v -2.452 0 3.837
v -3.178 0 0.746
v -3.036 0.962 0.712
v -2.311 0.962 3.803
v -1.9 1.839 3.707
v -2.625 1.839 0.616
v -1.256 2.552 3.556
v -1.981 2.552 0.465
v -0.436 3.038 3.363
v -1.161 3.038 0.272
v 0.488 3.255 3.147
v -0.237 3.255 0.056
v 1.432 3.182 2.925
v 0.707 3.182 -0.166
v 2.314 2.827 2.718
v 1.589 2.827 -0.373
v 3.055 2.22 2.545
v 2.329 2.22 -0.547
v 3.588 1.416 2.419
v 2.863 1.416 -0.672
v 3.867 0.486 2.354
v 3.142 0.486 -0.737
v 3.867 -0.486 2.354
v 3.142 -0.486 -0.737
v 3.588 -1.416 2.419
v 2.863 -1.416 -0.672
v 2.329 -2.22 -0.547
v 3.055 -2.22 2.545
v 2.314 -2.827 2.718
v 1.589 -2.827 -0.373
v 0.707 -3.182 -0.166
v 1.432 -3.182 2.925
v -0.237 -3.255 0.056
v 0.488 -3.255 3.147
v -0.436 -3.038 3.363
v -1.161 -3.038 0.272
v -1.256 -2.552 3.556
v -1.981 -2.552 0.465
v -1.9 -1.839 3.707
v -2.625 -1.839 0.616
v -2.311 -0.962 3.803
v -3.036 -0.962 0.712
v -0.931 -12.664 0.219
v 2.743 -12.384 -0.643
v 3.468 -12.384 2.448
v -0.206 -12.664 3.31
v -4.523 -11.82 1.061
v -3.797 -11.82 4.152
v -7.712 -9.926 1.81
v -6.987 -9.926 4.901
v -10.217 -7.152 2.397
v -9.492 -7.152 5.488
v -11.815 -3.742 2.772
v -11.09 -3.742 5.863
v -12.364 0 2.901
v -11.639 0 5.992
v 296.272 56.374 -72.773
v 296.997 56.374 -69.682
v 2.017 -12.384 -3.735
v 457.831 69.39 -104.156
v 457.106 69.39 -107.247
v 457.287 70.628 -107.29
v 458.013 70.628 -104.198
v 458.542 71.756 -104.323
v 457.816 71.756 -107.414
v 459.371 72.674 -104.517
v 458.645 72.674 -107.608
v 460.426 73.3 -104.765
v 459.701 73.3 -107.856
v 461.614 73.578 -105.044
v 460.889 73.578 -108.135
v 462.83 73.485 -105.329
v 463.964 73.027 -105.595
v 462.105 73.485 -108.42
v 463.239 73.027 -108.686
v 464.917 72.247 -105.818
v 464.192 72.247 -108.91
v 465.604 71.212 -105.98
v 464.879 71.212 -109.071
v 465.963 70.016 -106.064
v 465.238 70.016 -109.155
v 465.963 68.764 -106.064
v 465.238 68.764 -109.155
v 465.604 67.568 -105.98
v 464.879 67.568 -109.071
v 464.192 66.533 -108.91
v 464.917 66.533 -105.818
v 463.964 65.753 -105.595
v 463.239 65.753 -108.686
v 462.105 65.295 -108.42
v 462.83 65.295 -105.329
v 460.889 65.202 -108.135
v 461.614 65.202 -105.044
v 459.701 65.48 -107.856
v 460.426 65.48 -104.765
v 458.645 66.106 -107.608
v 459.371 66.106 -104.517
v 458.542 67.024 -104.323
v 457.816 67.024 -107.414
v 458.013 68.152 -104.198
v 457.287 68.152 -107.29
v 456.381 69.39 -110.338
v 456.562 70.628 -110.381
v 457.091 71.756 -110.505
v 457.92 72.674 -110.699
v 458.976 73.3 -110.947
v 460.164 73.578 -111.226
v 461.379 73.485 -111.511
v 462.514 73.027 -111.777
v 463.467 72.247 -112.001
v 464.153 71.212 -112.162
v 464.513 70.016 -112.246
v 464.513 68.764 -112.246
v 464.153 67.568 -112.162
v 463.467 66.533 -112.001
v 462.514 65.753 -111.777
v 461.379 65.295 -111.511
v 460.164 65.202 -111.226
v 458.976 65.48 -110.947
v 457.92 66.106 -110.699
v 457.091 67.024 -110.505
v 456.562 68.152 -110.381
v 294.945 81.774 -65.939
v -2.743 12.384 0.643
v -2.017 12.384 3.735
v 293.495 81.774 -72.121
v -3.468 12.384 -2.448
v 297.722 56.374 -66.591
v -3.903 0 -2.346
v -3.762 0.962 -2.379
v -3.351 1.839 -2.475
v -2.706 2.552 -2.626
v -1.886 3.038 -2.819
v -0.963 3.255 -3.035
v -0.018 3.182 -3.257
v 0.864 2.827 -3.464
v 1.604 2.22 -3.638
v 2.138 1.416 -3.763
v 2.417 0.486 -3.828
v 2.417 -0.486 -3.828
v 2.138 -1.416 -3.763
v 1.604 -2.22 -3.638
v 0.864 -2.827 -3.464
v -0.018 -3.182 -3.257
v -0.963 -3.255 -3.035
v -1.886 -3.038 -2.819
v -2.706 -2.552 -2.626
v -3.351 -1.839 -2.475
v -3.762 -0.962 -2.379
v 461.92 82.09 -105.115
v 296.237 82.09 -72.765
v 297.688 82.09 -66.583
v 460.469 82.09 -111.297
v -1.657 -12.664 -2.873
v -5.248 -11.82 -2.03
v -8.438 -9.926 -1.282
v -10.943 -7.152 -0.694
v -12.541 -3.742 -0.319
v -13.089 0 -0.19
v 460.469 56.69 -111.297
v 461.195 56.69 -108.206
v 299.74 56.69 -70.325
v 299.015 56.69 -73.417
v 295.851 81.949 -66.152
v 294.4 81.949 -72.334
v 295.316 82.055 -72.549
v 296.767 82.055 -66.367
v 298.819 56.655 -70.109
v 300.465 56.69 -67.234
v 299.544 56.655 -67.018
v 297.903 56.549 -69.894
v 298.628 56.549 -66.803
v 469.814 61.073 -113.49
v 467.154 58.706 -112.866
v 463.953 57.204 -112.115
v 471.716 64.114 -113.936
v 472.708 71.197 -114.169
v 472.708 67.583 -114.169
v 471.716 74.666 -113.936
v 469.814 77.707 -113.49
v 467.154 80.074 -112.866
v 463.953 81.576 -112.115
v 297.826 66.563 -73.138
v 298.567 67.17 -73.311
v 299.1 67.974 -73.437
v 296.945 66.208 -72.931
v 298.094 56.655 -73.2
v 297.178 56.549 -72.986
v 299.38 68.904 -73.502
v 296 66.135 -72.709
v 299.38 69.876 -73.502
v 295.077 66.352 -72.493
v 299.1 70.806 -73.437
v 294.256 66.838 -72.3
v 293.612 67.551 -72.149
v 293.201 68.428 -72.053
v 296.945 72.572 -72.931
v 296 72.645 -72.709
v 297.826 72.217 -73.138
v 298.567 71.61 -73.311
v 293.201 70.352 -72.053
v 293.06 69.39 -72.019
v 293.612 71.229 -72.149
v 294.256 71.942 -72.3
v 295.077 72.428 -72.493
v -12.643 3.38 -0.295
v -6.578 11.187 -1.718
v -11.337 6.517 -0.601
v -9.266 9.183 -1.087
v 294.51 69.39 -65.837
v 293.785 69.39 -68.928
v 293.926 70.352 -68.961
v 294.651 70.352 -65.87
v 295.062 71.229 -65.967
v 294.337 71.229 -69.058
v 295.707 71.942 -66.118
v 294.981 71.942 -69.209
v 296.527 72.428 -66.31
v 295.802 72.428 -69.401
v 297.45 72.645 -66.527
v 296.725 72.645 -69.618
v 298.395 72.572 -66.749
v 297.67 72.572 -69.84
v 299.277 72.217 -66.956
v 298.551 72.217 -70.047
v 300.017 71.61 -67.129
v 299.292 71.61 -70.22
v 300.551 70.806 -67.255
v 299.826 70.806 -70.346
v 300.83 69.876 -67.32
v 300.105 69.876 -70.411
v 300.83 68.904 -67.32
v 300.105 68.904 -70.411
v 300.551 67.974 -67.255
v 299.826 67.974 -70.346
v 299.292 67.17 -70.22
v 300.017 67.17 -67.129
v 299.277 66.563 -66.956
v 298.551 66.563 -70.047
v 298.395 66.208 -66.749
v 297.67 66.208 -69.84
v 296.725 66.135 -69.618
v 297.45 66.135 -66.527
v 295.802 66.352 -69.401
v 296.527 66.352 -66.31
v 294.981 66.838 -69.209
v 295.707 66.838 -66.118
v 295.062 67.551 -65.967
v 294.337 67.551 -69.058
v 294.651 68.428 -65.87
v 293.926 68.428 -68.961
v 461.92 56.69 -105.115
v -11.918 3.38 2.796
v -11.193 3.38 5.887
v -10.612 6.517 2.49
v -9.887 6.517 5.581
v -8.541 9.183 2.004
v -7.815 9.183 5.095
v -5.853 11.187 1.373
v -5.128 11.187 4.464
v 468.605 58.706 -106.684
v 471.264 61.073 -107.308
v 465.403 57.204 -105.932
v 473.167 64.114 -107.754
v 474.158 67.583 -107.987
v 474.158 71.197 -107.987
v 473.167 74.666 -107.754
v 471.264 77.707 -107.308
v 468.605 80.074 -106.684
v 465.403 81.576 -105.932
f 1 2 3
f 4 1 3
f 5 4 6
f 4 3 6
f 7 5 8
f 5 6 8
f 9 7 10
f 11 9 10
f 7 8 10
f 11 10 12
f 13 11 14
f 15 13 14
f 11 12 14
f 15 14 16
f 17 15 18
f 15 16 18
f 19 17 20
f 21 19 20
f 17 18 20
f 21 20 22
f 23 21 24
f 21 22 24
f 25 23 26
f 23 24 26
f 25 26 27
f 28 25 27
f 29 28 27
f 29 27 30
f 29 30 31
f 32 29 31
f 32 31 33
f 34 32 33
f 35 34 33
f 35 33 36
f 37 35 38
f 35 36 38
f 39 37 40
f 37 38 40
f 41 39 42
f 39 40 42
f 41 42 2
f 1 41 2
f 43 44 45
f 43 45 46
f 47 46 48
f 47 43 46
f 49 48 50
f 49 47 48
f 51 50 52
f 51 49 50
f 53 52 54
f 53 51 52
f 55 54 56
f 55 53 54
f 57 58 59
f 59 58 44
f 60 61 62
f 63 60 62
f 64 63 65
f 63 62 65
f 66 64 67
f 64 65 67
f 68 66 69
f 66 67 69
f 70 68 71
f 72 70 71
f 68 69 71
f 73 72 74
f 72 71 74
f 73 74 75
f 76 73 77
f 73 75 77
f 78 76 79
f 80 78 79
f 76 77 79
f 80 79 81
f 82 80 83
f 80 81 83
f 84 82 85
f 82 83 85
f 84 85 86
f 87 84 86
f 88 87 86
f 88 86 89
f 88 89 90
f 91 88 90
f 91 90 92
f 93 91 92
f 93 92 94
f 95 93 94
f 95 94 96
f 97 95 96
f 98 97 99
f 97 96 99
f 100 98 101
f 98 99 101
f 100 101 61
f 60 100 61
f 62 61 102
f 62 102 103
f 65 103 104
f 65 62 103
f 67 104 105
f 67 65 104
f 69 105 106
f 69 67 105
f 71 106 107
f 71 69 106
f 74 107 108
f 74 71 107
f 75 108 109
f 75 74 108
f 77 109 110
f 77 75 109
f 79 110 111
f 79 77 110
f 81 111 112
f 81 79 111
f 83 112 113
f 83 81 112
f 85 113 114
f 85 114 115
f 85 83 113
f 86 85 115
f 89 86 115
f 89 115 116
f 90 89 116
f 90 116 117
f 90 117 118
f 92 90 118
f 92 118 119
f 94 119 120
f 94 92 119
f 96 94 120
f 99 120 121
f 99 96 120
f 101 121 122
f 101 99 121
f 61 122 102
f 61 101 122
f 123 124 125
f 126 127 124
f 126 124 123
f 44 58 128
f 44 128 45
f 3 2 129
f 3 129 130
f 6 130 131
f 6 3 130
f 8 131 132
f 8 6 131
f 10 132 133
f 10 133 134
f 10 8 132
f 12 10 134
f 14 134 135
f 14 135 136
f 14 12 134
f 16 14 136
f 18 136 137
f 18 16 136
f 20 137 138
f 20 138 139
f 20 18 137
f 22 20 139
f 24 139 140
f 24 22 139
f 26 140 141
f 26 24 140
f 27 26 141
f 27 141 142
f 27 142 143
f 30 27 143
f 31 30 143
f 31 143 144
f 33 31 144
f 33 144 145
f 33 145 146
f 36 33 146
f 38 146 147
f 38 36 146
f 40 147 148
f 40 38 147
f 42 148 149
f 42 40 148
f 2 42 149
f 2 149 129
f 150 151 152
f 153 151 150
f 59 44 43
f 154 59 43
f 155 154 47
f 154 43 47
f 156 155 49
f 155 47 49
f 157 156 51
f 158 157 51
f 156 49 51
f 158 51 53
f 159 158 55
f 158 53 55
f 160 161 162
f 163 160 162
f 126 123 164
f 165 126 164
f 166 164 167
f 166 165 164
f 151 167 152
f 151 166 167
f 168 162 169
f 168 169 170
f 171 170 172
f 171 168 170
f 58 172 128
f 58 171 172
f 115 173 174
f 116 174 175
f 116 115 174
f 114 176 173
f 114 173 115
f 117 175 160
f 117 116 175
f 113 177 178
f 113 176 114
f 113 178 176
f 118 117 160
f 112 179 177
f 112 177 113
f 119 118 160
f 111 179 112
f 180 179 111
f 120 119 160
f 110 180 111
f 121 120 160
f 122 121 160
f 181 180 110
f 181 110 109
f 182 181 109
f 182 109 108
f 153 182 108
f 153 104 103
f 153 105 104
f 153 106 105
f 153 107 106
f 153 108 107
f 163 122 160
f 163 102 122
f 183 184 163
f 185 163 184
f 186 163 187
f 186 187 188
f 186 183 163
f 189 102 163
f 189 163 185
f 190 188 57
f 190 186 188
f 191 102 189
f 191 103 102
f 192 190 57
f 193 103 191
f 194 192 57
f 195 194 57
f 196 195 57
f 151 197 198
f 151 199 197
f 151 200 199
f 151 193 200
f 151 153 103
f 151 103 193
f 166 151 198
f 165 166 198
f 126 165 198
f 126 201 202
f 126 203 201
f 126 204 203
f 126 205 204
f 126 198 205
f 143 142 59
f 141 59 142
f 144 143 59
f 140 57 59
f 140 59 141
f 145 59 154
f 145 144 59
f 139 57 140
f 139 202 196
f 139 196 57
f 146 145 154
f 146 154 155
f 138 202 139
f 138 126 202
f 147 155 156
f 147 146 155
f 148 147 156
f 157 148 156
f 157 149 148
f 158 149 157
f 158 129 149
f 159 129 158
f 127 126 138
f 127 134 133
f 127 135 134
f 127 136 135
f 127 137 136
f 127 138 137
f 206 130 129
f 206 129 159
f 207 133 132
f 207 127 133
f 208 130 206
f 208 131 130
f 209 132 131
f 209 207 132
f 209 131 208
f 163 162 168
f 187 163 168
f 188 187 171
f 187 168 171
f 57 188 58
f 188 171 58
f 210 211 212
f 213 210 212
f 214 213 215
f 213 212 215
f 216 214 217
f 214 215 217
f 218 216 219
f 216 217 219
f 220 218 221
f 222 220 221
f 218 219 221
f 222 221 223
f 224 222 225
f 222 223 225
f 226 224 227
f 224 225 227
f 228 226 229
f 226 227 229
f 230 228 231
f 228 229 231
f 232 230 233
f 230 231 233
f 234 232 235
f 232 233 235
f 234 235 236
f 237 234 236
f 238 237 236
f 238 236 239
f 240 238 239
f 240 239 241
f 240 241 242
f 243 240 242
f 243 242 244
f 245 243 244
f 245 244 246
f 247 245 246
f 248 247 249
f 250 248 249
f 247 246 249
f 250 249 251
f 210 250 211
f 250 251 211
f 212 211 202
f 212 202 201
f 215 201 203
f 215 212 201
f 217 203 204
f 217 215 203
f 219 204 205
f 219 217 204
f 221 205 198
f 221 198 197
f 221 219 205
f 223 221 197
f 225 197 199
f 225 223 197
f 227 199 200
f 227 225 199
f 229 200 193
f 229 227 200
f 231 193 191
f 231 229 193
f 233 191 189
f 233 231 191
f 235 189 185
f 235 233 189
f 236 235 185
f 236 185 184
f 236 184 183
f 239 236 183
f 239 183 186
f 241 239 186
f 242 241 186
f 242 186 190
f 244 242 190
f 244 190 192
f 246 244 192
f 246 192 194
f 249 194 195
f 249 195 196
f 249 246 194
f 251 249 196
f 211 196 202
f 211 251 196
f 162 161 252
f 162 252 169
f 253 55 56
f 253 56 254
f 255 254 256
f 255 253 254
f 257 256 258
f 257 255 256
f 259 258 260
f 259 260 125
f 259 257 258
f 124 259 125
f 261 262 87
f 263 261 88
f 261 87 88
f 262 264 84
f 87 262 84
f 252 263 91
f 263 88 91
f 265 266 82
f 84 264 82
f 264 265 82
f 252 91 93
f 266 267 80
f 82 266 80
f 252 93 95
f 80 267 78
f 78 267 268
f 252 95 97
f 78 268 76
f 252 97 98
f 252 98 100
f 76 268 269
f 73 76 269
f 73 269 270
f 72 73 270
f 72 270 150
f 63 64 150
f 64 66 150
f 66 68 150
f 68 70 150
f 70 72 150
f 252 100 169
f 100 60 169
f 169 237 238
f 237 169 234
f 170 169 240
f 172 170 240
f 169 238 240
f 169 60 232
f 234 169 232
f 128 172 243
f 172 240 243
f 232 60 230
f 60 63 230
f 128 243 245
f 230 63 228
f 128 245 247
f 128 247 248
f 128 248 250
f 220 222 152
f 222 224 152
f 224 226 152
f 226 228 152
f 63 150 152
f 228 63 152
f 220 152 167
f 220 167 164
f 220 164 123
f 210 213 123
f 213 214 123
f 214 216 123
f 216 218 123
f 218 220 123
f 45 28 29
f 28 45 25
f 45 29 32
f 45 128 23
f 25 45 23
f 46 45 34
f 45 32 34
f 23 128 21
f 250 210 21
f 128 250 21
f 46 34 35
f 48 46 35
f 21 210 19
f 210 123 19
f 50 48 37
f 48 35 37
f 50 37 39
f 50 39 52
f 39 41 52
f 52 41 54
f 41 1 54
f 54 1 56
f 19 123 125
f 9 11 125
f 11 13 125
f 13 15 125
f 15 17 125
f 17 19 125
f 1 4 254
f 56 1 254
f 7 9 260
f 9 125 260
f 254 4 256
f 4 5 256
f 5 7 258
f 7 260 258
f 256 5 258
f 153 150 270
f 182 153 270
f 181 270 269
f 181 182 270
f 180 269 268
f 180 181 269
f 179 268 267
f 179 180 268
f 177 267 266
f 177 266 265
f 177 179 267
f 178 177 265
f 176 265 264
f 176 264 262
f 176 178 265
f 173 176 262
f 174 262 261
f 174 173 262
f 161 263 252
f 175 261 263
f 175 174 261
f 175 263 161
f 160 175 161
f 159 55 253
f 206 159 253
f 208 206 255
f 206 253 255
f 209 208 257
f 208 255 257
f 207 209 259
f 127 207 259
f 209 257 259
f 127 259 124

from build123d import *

# Parameters (mm, degrees)
SKETCH1_R           = 12.7
SKETCH1_R_2         = 3.2639
SKETCH1_R_3         = 4.19989
BOSS_EXTRUDE1_DEPTH = 3.175


with BuildPart() as part:
    # Sketch1 → Boss-Extrude1 (new, symmetric)
    # profile 1 of 4: a face of its own
    with BuildSketch(Plane(origin=(0, 0, 0), x_dir=(-0.9735629333039062, 0, 0.22841894601082008), z_dir=(-0.22841894601082008, 1.7517633279464725e-15, -0.9735629333039062))):
        Circle(SKETCH1_R)
        Circle(SKETCH1_R_2, mode=Mode.SUBTRACT)
    # profile 2 of 4: a face of its own
    with BuildSketch(Plane(origin=(0, 0, 0), x_dir=(-0.9735629333039062, 0, 0.22841894601082008), z_dir=(-0.22841894601082008, 1.7517633279464725e-15, -0.9735629333039062))):
        with BuildLine():
            ThreePointArc((-2.817127899, -12.383609748), (-12.383609748, 2.817127899), (2.817127899, 12.383609748))
            Line((2.817127899, 12.383609748), (-302.209540417, 81.773646649))
            ThreePointArc((-302.209540417, 81.773646649), (-295.100250928, 77.311920379), (-292.326668316, 69.390036901))
            ThreePointArc((-292.326668316, 69.390036901), (-314.006924437, 60.40978078), (-305.026668316, 82.090036901))
            Line((-305.026668316, 82.090036901), (-473.718412785, 82.090036901))
            ThreePointArc((-473.718412785, 82.090036901), (-464.738156664, 78.370293022), (-461.018412785, 69.390036901))
            ThreePointArc((-461.018412785, 69.390036901), (-464.738156664, 60.40978078), (-473.718412785, 56.690036901))
            Line((-473.718412785, 56.690036901), (-307.87932985, 56.690036901))
            ThreePointArc((-307.87932985, 56.690036901), (-306.461910329, 56.610691476), (-305.06220195, 56.373646649))
            Line((-305.06220195, 56.373646649), (-2.817127899, -12.383609748))
        make_face()
    # profile 3 of 4: a face of its own
    with BuildSketch(Plane(origin=(0, 0, 0), x_dir=(-0.9735629333039062, 0, 0.22841894601082008), z_dir=(-0.22841894601082008, 1.7517633279464725e-15, -0.9735629333039062))):
        with Locations((-473.718412785, 69.390036901)):
            Circle(SKETCH1_R)
        with Locations((-473.718412785, 69.390036901)):
            Circle(SKETCH1_R_3, mode=Mode.SUBTRACT)
    # profile 4 of 4: a face of its own
    with BuildSketch(Plane(origin=(0, 0, 0), x_dir=(-0.9735629333039062, 0, 0.22841894601082008), z_dir=(-0.22841894601082008, 1.7517633279464725e-15, -0.9735629333039062))):
        with Locations((-305.026668316, 69.390036901)):
            Circle(SKETCH1_R)
        with Locations((-305.026668316, 69.390036901)):
            Circle(SKETCH1_R_2, mode=Mode.SUBTRACT)
    extrude(amount=BOSS_EXTRUDE1_DEPTH, both=True)


solid = part.part
